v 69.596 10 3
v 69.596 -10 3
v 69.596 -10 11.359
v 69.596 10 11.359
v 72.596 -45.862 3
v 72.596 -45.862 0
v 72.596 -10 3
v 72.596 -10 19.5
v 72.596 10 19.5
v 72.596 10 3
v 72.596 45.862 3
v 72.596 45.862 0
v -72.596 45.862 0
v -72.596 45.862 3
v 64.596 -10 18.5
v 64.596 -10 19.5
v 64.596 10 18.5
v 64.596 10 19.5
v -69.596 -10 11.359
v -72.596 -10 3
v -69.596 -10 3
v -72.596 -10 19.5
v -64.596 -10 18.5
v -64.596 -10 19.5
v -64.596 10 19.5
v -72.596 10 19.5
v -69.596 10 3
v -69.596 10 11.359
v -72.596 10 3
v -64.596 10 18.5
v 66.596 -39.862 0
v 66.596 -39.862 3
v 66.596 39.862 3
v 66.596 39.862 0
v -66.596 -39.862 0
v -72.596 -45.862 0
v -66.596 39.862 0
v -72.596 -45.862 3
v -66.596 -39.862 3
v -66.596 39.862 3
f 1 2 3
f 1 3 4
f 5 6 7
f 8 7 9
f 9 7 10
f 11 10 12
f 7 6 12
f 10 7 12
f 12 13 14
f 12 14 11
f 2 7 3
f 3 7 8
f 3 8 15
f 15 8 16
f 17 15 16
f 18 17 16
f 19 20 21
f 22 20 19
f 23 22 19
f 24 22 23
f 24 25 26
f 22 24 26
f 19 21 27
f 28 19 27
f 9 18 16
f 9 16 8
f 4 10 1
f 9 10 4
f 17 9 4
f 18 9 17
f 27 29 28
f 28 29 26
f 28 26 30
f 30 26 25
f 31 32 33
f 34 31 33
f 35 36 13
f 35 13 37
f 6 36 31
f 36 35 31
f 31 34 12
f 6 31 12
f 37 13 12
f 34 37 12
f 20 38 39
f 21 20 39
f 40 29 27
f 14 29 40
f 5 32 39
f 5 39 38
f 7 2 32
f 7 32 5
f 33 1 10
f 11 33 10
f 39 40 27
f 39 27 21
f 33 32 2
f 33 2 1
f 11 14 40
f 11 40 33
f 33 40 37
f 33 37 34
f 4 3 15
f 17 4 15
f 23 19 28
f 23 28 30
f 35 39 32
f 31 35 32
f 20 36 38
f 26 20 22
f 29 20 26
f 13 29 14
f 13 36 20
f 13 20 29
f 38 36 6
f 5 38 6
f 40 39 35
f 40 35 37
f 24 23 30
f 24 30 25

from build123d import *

# Parameters (mm, degrees)
F0_W     = 145.192
F0_H     = 91.725
F1_DEPTH = 3
F2_W     = 133.192
F2_H     = 79.725
F3_DEPTH = 3
F4_W     = 3
F4_H     = 20
F5_DEPTH = 16.5
F7_DEPTH = 20


with BuildPart() as f1:
    # F0 (on Top) → F1 (new body)
    with BuildSketch(Plane.XY):
        Rectangle(F0_W, F0_H)
    extrude(amount=F1_DEPTH)

    # F2 (on face) → F3 (cut)
    with BuildSketch(Plane.XY.offset(3)):
        Rectangle(F2_W, F2_H)
    extrude(amount=-F3_DEPTH, mode=Mode.SUBTRACT)

    # F4 (on face) → F5 (join)
    with BuildSketch(Plane.XY.offset(3)):
        with Locations((-71.096, 0)):
            Rectangle(F4_W, F4_H)
    extrude(amount=F5_DEPTH)

    # F6 (on face) → F7 (join)
    with BuildSketch(Plane.XZ.offset(10)):
        Polygon((-64.596, 19.5), (-69.596, 19.5), (-69.596, 11.3592599663), (-64.596, 18.5), align=None)
    extrude(amount=-F7_DEPTH)

    # F8: F1 across plane


with BuildPart() as f1_1:
    add(f1.part)
    add(f1.part.mirror(Plane.YZ))


solid = f1_1.part
